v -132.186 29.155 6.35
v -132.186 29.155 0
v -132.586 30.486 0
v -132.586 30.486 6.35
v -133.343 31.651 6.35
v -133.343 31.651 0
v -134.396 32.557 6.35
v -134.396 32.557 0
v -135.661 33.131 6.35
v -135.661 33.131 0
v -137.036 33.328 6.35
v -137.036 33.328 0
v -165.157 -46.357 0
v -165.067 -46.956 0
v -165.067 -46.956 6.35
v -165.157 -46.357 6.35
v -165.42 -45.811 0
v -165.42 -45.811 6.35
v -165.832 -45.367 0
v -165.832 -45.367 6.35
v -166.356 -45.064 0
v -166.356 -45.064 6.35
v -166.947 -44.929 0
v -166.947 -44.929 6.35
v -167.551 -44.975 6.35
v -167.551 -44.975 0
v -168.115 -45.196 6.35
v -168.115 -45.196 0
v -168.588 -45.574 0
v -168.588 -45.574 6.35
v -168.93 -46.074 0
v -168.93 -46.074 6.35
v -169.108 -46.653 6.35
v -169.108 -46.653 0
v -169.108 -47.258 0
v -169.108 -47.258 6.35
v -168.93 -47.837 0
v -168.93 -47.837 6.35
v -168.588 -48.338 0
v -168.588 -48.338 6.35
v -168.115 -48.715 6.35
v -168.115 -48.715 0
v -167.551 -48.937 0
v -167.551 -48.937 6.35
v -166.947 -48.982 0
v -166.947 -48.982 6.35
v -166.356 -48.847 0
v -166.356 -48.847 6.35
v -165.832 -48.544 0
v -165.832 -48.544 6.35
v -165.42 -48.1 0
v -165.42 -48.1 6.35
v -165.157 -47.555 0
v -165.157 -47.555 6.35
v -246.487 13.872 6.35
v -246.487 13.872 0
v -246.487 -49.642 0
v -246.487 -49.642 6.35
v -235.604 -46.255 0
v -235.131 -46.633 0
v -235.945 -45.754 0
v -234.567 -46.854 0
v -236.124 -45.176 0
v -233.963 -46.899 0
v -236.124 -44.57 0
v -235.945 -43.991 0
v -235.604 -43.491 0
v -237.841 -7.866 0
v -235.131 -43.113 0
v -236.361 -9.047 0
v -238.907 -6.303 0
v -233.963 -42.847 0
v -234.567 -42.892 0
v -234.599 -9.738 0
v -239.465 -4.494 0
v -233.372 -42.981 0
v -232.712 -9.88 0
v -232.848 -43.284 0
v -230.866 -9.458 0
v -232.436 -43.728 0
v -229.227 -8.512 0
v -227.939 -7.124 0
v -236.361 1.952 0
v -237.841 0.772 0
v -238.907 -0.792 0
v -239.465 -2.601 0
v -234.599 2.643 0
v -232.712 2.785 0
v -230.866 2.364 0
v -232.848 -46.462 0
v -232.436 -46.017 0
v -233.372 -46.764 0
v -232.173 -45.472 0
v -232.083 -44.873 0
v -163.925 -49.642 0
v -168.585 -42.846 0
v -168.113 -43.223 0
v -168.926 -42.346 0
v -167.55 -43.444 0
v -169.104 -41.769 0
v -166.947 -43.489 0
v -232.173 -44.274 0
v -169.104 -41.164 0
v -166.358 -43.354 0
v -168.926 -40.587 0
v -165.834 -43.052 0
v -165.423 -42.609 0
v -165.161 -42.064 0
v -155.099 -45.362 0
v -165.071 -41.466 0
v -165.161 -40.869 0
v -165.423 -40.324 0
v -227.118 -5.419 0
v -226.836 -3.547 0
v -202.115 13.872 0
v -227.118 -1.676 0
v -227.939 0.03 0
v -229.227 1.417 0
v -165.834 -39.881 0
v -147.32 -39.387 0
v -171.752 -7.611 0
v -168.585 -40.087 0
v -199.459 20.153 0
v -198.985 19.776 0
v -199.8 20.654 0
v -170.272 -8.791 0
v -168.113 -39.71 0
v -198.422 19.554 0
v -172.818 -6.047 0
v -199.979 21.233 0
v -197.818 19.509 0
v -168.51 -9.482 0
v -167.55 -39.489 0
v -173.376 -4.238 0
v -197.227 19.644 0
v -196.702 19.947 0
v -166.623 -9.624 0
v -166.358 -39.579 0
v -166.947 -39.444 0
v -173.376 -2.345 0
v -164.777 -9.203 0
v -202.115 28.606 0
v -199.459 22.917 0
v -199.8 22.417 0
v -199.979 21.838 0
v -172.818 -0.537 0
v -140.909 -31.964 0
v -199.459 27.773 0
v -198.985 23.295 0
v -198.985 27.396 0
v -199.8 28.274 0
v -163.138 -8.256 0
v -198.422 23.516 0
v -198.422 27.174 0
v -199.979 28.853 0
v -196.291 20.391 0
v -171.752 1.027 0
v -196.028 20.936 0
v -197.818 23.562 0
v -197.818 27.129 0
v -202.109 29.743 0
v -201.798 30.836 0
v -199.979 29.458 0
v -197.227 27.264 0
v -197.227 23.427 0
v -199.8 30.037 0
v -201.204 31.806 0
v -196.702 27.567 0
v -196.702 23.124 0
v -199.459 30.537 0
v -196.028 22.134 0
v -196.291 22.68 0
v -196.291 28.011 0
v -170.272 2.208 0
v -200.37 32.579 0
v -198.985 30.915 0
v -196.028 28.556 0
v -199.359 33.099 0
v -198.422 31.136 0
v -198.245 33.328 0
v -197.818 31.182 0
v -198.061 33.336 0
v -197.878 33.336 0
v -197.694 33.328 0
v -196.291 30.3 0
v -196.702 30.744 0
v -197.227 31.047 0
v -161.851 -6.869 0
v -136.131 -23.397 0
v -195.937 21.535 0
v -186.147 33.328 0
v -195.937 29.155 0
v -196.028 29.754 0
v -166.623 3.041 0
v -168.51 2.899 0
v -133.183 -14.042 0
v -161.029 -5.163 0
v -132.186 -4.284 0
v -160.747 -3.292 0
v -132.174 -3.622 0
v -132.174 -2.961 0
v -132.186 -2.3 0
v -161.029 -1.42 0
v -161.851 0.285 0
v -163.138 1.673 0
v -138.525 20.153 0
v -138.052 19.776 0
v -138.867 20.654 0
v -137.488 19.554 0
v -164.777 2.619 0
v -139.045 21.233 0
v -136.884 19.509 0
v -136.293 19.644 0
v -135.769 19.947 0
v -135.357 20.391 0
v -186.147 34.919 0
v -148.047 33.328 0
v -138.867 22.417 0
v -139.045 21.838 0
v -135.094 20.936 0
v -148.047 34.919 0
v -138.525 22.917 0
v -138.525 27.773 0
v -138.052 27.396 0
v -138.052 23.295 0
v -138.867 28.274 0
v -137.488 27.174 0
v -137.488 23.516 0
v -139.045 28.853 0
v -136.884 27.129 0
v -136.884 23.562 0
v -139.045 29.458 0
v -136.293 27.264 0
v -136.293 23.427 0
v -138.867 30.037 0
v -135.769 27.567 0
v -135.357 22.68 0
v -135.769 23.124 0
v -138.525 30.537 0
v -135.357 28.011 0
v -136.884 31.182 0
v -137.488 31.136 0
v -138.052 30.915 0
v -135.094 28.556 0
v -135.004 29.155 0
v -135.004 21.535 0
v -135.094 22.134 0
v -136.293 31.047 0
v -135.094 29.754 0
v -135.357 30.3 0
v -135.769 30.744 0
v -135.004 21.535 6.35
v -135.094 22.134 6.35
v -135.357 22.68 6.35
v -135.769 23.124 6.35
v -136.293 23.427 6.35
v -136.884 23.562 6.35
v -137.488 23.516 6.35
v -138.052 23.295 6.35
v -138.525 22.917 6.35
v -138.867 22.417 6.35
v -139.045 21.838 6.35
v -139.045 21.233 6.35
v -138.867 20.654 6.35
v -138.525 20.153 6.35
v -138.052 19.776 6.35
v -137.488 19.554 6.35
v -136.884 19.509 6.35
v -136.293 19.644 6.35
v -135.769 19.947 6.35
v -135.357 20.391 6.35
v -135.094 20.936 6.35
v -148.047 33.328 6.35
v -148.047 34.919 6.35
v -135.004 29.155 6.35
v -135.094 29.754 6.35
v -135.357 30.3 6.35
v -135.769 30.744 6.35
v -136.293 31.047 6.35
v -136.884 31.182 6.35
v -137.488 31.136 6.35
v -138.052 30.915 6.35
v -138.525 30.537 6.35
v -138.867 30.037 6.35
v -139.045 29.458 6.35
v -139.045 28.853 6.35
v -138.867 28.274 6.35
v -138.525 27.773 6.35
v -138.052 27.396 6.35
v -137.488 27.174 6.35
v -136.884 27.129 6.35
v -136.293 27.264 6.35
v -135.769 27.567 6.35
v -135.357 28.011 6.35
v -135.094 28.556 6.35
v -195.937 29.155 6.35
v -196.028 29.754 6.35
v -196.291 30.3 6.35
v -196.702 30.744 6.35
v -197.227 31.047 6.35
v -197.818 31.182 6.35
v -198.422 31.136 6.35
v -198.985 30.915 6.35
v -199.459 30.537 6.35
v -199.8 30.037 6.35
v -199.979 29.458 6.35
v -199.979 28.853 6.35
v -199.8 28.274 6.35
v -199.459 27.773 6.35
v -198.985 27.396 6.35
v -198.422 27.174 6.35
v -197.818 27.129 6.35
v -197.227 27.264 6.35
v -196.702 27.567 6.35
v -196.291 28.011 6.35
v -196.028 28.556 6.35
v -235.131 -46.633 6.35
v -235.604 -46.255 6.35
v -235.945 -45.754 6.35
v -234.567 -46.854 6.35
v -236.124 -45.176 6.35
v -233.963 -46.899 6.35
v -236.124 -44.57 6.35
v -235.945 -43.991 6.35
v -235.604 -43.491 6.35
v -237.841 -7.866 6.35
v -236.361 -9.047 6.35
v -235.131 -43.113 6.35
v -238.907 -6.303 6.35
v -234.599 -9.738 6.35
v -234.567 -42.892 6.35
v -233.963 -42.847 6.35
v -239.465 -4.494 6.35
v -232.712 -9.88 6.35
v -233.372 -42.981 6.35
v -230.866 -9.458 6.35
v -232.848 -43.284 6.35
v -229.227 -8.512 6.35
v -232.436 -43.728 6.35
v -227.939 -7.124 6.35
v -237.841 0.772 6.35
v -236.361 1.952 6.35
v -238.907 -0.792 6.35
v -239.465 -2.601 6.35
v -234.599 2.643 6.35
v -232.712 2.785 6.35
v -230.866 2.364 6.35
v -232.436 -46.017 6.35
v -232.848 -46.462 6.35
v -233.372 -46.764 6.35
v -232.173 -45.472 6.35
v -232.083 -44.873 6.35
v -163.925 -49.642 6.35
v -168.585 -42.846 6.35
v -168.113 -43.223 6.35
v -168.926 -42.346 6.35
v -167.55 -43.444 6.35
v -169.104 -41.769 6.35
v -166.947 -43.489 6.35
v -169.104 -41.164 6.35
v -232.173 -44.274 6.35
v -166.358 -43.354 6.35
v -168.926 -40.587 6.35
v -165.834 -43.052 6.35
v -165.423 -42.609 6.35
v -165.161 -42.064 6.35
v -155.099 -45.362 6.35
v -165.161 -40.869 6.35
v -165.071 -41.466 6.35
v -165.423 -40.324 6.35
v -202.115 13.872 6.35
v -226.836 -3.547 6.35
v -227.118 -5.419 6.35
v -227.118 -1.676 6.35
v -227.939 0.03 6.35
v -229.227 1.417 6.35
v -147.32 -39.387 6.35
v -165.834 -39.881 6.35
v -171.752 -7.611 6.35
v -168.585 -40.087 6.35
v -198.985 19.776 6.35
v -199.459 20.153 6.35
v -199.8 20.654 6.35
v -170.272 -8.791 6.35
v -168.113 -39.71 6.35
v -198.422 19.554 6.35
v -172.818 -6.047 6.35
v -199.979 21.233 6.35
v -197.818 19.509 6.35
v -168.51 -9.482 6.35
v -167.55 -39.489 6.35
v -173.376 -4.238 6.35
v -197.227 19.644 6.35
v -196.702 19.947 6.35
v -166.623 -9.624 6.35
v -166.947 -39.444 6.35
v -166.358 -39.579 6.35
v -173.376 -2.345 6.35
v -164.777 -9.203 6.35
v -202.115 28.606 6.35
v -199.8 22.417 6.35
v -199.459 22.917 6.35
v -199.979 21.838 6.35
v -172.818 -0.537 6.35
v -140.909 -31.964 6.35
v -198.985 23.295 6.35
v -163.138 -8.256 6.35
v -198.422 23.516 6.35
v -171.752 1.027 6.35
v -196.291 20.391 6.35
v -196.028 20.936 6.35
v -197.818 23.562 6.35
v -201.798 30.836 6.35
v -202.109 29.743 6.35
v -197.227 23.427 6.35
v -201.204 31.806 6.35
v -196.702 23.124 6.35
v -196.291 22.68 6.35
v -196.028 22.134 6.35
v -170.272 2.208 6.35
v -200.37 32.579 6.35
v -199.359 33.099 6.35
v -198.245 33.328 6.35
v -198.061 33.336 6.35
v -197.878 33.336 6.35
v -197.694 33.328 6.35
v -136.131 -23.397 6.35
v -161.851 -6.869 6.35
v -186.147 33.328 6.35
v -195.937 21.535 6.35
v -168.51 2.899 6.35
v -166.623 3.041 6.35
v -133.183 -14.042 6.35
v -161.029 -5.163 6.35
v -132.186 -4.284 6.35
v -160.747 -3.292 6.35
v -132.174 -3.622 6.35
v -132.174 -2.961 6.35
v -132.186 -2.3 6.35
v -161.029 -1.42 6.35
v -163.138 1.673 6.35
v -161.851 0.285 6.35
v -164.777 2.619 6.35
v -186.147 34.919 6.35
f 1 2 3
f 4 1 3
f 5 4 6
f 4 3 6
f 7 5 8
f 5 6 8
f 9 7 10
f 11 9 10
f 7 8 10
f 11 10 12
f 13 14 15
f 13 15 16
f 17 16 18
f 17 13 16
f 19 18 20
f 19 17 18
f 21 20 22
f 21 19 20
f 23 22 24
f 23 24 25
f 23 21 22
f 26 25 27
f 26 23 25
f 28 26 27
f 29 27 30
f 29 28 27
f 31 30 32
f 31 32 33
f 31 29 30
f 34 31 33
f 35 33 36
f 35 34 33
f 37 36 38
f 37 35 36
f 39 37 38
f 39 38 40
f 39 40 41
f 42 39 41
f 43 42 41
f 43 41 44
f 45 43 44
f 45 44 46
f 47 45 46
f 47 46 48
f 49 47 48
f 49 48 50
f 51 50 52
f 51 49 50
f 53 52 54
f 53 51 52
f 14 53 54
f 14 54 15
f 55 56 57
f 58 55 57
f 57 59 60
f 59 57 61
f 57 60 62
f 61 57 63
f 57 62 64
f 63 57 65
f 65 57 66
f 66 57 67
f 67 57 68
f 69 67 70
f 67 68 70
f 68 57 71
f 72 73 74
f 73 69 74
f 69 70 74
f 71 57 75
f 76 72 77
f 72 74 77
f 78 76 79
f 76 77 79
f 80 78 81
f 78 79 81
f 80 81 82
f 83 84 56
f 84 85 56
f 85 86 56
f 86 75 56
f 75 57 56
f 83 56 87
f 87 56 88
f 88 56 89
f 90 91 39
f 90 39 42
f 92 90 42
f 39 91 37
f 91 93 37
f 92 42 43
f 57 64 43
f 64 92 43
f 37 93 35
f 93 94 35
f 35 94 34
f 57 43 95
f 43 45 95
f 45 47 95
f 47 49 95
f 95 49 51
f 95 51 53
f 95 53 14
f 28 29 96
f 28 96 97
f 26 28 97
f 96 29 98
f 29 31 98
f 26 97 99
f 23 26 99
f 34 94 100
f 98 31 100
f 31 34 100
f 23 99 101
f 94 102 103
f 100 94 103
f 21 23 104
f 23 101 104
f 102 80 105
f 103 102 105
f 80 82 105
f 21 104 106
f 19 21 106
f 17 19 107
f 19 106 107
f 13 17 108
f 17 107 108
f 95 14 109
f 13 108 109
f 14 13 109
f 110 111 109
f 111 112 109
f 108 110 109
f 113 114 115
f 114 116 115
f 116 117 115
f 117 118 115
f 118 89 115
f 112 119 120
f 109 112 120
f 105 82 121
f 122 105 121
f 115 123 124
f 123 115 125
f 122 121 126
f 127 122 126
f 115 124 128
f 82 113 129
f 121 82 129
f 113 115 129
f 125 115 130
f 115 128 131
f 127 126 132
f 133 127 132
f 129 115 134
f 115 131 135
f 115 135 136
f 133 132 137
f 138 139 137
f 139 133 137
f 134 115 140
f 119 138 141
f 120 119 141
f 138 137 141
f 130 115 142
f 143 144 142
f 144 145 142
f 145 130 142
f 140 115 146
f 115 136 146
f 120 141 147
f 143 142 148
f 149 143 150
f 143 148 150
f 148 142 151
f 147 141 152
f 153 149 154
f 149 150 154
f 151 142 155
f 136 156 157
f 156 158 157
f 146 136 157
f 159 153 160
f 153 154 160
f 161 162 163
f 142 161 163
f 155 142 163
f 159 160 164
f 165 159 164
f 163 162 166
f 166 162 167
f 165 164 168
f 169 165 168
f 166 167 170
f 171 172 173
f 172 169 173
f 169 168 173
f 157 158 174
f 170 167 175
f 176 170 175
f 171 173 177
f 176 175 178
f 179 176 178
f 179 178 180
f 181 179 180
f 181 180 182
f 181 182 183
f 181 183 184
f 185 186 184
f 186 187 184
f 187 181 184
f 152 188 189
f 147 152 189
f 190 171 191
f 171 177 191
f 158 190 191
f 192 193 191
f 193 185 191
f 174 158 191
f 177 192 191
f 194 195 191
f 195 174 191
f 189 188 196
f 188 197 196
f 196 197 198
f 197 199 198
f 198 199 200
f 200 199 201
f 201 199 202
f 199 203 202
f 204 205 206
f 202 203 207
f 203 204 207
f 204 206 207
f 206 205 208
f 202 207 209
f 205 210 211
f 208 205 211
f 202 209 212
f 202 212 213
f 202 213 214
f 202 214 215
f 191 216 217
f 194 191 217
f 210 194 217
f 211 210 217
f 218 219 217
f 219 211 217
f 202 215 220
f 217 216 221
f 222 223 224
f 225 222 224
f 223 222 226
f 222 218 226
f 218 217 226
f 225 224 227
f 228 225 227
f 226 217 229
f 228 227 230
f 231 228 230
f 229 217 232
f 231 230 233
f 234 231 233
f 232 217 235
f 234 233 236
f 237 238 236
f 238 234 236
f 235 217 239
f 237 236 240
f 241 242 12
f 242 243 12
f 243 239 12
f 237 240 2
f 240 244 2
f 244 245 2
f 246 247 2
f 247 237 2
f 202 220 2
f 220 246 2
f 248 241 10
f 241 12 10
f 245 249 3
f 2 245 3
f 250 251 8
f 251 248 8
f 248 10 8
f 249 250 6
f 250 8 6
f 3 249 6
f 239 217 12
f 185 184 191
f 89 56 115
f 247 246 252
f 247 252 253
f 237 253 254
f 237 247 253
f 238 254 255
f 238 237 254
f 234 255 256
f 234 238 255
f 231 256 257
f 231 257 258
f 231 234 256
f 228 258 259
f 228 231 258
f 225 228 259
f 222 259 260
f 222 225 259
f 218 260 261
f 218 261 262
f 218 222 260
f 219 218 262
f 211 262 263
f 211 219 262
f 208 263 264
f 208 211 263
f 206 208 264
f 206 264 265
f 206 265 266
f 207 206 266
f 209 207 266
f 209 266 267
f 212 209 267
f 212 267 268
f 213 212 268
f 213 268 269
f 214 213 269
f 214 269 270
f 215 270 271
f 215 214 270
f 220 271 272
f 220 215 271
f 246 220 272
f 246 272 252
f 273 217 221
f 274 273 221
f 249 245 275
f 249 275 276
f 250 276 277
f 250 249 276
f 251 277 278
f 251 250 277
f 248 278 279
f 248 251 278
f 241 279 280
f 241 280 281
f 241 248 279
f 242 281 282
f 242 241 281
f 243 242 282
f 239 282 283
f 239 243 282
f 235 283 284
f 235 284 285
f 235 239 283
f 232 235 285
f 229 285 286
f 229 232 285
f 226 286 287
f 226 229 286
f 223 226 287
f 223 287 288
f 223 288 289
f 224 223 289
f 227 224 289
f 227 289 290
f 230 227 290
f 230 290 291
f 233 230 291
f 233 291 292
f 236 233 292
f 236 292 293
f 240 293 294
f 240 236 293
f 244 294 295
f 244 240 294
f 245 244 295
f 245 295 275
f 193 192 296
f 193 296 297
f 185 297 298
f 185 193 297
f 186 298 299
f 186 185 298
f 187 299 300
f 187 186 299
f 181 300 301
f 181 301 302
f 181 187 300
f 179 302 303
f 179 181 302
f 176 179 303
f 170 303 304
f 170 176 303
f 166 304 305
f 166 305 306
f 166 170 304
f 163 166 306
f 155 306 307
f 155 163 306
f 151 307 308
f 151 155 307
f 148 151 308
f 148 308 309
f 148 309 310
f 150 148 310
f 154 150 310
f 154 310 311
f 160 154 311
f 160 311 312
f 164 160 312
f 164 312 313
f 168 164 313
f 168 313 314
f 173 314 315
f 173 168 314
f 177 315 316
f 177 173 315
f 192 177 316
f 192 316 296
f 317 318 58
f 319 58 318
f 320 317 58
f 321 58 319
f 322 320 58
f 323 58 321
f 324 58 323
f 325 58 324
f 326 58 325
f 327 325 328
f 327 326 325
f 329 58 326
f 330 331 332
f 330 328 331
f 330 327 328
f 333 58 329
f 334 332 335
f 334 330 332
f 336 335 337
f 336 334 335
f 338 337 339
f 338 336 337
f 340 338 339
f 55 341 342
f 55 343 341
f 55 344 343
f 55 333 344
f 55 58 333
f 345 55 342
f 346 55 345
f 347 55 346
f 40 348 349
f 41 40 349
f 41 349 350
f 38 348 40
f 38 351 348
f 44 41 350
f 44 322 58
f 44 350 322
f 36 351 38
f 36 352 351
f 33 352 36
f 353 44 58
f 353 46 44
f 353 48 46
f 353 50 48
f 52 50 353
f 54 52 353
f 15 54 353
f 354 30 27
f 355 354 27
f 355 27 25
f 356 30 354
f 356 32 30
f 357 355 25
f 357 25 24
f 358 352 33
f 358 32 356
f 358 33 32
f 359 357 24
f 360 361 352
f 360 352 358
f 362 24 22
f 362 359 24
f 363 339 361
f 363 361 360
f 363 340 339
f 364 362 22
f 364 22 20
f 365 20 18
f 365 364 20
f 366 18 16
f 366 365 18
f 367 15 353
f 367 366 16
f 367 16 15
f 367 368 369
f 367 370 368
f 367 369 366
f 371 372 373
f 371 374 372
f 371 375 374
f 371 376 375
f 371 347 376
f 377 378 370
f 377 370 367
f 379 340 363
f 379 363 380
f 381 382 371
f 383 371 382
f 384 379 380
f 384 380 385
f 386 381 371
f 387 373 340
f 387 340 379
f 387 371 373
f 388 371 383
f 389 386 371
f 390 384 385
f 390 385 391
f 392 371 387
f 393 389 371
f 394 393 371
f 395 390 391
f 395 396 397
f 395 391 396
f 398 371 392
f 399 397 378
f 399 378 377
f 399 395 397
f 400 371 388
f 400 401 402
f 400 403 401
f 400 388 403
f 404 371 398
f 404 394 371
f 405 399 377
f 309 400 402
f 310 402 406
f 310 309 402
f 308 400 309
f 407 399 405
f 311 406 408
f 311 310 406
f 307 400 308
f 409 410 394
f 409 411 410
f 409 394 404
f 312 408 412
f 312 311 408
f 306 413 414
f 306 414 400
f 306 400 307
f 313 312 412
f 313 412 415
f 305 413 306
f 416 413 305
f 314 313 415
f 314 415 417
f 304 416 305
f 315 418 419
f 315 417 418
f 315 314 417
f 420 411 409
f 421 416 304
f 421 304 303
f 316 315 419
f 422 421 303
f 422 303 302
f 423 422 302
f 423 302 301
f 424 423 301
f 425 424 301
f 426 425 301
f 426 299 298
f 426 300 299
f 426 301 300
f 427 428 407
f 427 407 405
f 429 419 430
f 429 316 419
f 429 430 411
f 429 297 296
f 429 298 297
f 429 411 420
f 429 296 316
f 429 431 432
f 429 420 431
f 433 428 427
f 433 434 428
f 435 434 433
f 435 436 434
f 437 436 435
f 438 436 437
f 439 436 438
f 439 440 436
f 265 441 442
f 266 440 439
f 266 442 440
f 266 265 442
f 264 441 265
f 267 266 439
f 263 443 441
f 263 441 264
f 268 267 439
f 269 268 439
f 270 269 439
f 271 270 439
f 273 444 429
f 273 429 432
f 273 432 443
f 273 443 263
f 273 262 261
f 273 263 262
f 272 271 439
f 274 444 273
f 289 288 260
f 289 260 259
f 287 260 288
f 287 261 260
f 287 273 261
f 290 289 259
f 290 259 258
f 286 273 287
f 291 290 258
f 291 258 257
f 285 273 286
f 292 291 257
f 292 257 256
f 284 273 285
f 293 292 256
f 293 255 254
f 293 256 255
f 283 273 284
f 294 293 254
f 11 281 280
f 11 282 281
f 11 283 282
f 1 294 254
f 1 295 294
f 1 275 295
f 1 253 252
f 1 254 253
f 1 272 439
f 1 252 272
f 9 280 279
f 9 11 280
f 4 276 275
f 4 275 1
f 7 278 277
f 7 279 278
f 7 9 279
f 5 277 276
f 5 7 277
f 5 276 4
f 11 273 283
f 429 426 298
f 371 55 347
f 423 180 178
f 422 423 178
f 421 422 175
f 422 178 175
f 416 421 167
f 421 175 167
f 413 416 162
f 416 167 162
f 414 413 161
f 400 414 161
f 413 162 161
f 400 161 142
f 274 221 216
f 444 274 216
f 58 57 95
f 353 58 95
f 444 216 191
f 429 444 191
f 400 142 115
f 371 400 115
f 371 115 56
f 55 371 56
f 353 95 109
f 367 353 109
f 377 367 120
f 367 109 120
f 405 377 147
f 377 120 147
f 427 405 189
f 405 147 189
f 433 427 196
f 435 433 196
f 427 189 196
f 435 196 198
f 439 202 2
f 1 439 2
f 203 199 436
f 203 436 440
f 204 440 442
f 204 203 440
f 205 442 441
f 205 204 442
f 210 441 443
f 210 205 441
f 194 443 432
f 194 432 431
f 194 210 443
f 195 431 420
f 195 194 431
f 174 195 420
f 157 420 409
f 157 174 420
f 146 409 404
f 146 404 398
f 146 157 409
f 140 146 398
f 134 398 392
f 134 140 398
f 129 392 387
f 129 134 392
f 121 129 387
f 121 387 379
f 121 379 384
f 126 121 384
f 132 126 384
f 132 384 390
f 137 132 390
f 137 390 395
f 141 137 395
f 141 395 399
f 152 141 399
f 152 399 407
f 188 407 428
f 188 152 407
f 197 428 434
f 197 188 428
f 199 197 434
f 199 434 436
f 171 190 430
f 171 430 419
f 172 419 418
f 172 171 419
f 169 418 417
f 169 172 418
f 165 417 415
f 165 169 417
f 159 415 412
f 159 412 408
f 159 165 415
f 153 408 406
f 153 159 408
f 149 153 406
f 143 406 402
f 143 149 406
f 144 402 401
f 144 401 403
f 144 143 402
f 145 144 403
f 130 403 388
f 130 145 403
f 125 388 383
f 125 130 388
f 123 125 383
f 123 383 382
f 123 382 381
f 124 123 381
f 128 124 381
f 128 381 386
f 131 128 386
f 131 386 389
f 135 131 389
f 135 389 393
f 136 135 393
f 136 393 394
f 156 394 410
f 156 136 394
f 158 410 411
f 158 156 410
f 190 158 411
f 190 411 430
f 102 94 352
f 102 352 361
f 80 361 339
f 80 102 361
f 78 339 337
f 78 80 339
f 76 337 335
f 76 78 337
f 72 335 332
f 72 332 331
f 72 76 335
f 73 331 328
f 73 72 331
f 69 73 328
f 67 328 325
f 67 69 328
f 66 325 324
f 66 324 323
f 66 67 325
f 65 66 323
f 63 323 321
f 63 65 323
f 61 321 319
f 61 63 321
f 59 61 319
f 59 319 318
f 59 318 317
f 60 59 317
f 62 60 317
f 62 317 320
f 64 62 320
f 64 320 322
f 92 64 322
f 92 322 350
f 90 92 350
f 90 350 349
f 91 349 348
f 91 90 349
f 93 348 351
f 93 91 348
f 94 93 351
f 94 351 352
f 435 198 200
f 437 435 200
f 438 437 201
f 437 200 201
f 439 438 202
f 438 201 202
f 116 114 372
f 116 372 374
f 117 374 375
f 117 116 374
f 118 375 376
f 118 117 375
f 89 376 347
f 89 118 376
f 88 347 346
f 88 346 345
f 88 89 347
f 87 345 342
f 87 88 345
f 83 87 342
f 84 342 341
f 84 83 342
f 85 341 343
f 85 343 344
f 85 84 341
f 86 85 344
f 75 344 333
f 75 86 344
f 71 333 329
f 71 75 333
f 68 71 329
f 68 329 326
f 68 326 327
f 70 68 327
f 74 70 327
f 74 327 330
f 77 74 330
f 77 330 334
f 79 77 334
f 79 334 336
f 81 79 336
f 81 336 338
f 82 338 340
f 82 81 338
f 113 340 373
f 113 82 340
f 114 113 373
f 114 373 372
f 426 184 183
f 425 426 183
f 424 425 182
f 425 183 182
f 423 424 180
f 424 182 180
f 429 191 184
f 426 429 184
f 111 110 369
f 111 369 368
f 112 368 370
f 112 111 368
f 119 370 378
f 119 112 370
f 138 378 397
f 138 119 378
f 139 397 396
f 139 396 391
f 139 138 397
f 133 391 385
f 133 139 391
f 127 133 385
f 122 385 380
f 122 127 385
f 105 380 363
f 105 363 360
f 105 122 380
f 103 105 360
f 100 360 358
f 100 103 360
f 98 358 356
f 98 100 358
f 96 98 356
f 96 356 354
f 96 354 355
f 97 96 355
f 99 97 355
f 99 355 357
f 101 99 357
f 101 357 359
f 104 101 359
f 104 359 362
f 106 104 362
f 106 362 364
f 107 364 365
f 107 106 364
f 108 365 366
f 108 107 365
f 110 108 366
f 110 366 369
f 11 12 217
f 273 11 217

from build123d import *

# Parameters (mm, degrees)
F0_R     = 2.032
F0_R_2   = 2.027946
F0_R_3   = 6.35
F1_DEPTH = 6.35


with BuildPart() as f1:
    # F0 (on Top) → F1 (new body)
    with BuildSketch(Plane.XY):
        with BuildLine():
            Line((-170.272195, -49.641607), (-163.925477, -49.641607))
            ThreePointArc((-163.925477, -49.641607), (-140.909058, -31.963569), (-132.186283, -4.28358))
            Line((-132.186283, -4.28358), (-132.186283, -2.299813))
            Line((-132.186283, -2.299813), (-132.186283, 29.155357))
            ThreePointArc((-132.186283, 29.155357), (-133.837078, 32.141068), (-137.035743, 33.327715))
            Line((-137.035743, 33.327715), (-148.047195, 33.327715))
            Line((-148.047195, 33.327715), (-148.047195, 34.918903))
            Line((-148.047195, 34.918903), (-186.147195, 34.918903))
            Line((-186.147195, 34.918903), (-186.147195, 33.327715))
            Line((-186.147195, 33.327715), (-197.693917, 33.327715))
            Line((-197.693917, 33.327715), (-198.24493, 33.327715))
            ThreePointArc((-198.24493, 33.327715), (-201.203656, 31.805681), (-202.114563, 28.605541))
            Line((-202.114563, 28.605541), (-202.114563, 13.871952))
            Line((-202.114563, 13.871952), (-246.486589, 13.871952))
            Line((-246.486589, 13.871952), (-246.486589, -49.641607))
            Line((-246.486589, -49.641607), (-240.805238, -49.641607))
            Line((-240.805238, -49.641607), (-170.272195, -49.641607))
        make_face()
        with Locations((-234.114588, -44.87283)):
            Circle(F0_R, mode=Mode.SUBTRACT)
        with Locations((-167.098836, -46.955632)):
            Circle(F0_R, mode=Mode.SUBTRACT)
        with Locations((-167.098836, -41.466439)):
            Circle(F0_R_2, mode=Mode.SUBTRACT)
        with Locations((-233.186065, -3.547357)):
            Circle(F0_R_3, mode=Mode.SUBTRACT)
        with Locations((-197.969424, 21.535357)):
            Circle(F0_R, mode=Mode.SUBTRACT)
        with Locations((-197.969424, 29.155357)):
            Circle(F0_R, mode=Mode.SUBTRACT)
        with Locations((-167.097195, -3.291697)):
            Circle(F0_R_3, mode=Mode.SUBTRACT)
        with Locations((-137.035743, 21.535357)):
            Circle(F0_R, mode=Mode.SUBTRACT)
        with Locations((-137.035743, 29.155357)):
            Circle(F0_R, mode=Mode.SUBTRACT)
        with BuildLine():
            Line((-132.186283, -2.299813), (-132.186283, -4.28358))
            ThreePointArc((-132.186283, -4.28358), (-132.172195, -3.291697), (-132.186283, -2.299813))
        make_face()
        with BuildLine():
            ThreePointArc((-197.693917, 33.327715), (-197.969424, 33.336801), (-198.24493, 33.327715))
            Line((-198.24493, 33.327715), (-197.693917, 33.327715))
        make_face()
    extrude(amount=F1_DEPTH)


solid = f1.part
